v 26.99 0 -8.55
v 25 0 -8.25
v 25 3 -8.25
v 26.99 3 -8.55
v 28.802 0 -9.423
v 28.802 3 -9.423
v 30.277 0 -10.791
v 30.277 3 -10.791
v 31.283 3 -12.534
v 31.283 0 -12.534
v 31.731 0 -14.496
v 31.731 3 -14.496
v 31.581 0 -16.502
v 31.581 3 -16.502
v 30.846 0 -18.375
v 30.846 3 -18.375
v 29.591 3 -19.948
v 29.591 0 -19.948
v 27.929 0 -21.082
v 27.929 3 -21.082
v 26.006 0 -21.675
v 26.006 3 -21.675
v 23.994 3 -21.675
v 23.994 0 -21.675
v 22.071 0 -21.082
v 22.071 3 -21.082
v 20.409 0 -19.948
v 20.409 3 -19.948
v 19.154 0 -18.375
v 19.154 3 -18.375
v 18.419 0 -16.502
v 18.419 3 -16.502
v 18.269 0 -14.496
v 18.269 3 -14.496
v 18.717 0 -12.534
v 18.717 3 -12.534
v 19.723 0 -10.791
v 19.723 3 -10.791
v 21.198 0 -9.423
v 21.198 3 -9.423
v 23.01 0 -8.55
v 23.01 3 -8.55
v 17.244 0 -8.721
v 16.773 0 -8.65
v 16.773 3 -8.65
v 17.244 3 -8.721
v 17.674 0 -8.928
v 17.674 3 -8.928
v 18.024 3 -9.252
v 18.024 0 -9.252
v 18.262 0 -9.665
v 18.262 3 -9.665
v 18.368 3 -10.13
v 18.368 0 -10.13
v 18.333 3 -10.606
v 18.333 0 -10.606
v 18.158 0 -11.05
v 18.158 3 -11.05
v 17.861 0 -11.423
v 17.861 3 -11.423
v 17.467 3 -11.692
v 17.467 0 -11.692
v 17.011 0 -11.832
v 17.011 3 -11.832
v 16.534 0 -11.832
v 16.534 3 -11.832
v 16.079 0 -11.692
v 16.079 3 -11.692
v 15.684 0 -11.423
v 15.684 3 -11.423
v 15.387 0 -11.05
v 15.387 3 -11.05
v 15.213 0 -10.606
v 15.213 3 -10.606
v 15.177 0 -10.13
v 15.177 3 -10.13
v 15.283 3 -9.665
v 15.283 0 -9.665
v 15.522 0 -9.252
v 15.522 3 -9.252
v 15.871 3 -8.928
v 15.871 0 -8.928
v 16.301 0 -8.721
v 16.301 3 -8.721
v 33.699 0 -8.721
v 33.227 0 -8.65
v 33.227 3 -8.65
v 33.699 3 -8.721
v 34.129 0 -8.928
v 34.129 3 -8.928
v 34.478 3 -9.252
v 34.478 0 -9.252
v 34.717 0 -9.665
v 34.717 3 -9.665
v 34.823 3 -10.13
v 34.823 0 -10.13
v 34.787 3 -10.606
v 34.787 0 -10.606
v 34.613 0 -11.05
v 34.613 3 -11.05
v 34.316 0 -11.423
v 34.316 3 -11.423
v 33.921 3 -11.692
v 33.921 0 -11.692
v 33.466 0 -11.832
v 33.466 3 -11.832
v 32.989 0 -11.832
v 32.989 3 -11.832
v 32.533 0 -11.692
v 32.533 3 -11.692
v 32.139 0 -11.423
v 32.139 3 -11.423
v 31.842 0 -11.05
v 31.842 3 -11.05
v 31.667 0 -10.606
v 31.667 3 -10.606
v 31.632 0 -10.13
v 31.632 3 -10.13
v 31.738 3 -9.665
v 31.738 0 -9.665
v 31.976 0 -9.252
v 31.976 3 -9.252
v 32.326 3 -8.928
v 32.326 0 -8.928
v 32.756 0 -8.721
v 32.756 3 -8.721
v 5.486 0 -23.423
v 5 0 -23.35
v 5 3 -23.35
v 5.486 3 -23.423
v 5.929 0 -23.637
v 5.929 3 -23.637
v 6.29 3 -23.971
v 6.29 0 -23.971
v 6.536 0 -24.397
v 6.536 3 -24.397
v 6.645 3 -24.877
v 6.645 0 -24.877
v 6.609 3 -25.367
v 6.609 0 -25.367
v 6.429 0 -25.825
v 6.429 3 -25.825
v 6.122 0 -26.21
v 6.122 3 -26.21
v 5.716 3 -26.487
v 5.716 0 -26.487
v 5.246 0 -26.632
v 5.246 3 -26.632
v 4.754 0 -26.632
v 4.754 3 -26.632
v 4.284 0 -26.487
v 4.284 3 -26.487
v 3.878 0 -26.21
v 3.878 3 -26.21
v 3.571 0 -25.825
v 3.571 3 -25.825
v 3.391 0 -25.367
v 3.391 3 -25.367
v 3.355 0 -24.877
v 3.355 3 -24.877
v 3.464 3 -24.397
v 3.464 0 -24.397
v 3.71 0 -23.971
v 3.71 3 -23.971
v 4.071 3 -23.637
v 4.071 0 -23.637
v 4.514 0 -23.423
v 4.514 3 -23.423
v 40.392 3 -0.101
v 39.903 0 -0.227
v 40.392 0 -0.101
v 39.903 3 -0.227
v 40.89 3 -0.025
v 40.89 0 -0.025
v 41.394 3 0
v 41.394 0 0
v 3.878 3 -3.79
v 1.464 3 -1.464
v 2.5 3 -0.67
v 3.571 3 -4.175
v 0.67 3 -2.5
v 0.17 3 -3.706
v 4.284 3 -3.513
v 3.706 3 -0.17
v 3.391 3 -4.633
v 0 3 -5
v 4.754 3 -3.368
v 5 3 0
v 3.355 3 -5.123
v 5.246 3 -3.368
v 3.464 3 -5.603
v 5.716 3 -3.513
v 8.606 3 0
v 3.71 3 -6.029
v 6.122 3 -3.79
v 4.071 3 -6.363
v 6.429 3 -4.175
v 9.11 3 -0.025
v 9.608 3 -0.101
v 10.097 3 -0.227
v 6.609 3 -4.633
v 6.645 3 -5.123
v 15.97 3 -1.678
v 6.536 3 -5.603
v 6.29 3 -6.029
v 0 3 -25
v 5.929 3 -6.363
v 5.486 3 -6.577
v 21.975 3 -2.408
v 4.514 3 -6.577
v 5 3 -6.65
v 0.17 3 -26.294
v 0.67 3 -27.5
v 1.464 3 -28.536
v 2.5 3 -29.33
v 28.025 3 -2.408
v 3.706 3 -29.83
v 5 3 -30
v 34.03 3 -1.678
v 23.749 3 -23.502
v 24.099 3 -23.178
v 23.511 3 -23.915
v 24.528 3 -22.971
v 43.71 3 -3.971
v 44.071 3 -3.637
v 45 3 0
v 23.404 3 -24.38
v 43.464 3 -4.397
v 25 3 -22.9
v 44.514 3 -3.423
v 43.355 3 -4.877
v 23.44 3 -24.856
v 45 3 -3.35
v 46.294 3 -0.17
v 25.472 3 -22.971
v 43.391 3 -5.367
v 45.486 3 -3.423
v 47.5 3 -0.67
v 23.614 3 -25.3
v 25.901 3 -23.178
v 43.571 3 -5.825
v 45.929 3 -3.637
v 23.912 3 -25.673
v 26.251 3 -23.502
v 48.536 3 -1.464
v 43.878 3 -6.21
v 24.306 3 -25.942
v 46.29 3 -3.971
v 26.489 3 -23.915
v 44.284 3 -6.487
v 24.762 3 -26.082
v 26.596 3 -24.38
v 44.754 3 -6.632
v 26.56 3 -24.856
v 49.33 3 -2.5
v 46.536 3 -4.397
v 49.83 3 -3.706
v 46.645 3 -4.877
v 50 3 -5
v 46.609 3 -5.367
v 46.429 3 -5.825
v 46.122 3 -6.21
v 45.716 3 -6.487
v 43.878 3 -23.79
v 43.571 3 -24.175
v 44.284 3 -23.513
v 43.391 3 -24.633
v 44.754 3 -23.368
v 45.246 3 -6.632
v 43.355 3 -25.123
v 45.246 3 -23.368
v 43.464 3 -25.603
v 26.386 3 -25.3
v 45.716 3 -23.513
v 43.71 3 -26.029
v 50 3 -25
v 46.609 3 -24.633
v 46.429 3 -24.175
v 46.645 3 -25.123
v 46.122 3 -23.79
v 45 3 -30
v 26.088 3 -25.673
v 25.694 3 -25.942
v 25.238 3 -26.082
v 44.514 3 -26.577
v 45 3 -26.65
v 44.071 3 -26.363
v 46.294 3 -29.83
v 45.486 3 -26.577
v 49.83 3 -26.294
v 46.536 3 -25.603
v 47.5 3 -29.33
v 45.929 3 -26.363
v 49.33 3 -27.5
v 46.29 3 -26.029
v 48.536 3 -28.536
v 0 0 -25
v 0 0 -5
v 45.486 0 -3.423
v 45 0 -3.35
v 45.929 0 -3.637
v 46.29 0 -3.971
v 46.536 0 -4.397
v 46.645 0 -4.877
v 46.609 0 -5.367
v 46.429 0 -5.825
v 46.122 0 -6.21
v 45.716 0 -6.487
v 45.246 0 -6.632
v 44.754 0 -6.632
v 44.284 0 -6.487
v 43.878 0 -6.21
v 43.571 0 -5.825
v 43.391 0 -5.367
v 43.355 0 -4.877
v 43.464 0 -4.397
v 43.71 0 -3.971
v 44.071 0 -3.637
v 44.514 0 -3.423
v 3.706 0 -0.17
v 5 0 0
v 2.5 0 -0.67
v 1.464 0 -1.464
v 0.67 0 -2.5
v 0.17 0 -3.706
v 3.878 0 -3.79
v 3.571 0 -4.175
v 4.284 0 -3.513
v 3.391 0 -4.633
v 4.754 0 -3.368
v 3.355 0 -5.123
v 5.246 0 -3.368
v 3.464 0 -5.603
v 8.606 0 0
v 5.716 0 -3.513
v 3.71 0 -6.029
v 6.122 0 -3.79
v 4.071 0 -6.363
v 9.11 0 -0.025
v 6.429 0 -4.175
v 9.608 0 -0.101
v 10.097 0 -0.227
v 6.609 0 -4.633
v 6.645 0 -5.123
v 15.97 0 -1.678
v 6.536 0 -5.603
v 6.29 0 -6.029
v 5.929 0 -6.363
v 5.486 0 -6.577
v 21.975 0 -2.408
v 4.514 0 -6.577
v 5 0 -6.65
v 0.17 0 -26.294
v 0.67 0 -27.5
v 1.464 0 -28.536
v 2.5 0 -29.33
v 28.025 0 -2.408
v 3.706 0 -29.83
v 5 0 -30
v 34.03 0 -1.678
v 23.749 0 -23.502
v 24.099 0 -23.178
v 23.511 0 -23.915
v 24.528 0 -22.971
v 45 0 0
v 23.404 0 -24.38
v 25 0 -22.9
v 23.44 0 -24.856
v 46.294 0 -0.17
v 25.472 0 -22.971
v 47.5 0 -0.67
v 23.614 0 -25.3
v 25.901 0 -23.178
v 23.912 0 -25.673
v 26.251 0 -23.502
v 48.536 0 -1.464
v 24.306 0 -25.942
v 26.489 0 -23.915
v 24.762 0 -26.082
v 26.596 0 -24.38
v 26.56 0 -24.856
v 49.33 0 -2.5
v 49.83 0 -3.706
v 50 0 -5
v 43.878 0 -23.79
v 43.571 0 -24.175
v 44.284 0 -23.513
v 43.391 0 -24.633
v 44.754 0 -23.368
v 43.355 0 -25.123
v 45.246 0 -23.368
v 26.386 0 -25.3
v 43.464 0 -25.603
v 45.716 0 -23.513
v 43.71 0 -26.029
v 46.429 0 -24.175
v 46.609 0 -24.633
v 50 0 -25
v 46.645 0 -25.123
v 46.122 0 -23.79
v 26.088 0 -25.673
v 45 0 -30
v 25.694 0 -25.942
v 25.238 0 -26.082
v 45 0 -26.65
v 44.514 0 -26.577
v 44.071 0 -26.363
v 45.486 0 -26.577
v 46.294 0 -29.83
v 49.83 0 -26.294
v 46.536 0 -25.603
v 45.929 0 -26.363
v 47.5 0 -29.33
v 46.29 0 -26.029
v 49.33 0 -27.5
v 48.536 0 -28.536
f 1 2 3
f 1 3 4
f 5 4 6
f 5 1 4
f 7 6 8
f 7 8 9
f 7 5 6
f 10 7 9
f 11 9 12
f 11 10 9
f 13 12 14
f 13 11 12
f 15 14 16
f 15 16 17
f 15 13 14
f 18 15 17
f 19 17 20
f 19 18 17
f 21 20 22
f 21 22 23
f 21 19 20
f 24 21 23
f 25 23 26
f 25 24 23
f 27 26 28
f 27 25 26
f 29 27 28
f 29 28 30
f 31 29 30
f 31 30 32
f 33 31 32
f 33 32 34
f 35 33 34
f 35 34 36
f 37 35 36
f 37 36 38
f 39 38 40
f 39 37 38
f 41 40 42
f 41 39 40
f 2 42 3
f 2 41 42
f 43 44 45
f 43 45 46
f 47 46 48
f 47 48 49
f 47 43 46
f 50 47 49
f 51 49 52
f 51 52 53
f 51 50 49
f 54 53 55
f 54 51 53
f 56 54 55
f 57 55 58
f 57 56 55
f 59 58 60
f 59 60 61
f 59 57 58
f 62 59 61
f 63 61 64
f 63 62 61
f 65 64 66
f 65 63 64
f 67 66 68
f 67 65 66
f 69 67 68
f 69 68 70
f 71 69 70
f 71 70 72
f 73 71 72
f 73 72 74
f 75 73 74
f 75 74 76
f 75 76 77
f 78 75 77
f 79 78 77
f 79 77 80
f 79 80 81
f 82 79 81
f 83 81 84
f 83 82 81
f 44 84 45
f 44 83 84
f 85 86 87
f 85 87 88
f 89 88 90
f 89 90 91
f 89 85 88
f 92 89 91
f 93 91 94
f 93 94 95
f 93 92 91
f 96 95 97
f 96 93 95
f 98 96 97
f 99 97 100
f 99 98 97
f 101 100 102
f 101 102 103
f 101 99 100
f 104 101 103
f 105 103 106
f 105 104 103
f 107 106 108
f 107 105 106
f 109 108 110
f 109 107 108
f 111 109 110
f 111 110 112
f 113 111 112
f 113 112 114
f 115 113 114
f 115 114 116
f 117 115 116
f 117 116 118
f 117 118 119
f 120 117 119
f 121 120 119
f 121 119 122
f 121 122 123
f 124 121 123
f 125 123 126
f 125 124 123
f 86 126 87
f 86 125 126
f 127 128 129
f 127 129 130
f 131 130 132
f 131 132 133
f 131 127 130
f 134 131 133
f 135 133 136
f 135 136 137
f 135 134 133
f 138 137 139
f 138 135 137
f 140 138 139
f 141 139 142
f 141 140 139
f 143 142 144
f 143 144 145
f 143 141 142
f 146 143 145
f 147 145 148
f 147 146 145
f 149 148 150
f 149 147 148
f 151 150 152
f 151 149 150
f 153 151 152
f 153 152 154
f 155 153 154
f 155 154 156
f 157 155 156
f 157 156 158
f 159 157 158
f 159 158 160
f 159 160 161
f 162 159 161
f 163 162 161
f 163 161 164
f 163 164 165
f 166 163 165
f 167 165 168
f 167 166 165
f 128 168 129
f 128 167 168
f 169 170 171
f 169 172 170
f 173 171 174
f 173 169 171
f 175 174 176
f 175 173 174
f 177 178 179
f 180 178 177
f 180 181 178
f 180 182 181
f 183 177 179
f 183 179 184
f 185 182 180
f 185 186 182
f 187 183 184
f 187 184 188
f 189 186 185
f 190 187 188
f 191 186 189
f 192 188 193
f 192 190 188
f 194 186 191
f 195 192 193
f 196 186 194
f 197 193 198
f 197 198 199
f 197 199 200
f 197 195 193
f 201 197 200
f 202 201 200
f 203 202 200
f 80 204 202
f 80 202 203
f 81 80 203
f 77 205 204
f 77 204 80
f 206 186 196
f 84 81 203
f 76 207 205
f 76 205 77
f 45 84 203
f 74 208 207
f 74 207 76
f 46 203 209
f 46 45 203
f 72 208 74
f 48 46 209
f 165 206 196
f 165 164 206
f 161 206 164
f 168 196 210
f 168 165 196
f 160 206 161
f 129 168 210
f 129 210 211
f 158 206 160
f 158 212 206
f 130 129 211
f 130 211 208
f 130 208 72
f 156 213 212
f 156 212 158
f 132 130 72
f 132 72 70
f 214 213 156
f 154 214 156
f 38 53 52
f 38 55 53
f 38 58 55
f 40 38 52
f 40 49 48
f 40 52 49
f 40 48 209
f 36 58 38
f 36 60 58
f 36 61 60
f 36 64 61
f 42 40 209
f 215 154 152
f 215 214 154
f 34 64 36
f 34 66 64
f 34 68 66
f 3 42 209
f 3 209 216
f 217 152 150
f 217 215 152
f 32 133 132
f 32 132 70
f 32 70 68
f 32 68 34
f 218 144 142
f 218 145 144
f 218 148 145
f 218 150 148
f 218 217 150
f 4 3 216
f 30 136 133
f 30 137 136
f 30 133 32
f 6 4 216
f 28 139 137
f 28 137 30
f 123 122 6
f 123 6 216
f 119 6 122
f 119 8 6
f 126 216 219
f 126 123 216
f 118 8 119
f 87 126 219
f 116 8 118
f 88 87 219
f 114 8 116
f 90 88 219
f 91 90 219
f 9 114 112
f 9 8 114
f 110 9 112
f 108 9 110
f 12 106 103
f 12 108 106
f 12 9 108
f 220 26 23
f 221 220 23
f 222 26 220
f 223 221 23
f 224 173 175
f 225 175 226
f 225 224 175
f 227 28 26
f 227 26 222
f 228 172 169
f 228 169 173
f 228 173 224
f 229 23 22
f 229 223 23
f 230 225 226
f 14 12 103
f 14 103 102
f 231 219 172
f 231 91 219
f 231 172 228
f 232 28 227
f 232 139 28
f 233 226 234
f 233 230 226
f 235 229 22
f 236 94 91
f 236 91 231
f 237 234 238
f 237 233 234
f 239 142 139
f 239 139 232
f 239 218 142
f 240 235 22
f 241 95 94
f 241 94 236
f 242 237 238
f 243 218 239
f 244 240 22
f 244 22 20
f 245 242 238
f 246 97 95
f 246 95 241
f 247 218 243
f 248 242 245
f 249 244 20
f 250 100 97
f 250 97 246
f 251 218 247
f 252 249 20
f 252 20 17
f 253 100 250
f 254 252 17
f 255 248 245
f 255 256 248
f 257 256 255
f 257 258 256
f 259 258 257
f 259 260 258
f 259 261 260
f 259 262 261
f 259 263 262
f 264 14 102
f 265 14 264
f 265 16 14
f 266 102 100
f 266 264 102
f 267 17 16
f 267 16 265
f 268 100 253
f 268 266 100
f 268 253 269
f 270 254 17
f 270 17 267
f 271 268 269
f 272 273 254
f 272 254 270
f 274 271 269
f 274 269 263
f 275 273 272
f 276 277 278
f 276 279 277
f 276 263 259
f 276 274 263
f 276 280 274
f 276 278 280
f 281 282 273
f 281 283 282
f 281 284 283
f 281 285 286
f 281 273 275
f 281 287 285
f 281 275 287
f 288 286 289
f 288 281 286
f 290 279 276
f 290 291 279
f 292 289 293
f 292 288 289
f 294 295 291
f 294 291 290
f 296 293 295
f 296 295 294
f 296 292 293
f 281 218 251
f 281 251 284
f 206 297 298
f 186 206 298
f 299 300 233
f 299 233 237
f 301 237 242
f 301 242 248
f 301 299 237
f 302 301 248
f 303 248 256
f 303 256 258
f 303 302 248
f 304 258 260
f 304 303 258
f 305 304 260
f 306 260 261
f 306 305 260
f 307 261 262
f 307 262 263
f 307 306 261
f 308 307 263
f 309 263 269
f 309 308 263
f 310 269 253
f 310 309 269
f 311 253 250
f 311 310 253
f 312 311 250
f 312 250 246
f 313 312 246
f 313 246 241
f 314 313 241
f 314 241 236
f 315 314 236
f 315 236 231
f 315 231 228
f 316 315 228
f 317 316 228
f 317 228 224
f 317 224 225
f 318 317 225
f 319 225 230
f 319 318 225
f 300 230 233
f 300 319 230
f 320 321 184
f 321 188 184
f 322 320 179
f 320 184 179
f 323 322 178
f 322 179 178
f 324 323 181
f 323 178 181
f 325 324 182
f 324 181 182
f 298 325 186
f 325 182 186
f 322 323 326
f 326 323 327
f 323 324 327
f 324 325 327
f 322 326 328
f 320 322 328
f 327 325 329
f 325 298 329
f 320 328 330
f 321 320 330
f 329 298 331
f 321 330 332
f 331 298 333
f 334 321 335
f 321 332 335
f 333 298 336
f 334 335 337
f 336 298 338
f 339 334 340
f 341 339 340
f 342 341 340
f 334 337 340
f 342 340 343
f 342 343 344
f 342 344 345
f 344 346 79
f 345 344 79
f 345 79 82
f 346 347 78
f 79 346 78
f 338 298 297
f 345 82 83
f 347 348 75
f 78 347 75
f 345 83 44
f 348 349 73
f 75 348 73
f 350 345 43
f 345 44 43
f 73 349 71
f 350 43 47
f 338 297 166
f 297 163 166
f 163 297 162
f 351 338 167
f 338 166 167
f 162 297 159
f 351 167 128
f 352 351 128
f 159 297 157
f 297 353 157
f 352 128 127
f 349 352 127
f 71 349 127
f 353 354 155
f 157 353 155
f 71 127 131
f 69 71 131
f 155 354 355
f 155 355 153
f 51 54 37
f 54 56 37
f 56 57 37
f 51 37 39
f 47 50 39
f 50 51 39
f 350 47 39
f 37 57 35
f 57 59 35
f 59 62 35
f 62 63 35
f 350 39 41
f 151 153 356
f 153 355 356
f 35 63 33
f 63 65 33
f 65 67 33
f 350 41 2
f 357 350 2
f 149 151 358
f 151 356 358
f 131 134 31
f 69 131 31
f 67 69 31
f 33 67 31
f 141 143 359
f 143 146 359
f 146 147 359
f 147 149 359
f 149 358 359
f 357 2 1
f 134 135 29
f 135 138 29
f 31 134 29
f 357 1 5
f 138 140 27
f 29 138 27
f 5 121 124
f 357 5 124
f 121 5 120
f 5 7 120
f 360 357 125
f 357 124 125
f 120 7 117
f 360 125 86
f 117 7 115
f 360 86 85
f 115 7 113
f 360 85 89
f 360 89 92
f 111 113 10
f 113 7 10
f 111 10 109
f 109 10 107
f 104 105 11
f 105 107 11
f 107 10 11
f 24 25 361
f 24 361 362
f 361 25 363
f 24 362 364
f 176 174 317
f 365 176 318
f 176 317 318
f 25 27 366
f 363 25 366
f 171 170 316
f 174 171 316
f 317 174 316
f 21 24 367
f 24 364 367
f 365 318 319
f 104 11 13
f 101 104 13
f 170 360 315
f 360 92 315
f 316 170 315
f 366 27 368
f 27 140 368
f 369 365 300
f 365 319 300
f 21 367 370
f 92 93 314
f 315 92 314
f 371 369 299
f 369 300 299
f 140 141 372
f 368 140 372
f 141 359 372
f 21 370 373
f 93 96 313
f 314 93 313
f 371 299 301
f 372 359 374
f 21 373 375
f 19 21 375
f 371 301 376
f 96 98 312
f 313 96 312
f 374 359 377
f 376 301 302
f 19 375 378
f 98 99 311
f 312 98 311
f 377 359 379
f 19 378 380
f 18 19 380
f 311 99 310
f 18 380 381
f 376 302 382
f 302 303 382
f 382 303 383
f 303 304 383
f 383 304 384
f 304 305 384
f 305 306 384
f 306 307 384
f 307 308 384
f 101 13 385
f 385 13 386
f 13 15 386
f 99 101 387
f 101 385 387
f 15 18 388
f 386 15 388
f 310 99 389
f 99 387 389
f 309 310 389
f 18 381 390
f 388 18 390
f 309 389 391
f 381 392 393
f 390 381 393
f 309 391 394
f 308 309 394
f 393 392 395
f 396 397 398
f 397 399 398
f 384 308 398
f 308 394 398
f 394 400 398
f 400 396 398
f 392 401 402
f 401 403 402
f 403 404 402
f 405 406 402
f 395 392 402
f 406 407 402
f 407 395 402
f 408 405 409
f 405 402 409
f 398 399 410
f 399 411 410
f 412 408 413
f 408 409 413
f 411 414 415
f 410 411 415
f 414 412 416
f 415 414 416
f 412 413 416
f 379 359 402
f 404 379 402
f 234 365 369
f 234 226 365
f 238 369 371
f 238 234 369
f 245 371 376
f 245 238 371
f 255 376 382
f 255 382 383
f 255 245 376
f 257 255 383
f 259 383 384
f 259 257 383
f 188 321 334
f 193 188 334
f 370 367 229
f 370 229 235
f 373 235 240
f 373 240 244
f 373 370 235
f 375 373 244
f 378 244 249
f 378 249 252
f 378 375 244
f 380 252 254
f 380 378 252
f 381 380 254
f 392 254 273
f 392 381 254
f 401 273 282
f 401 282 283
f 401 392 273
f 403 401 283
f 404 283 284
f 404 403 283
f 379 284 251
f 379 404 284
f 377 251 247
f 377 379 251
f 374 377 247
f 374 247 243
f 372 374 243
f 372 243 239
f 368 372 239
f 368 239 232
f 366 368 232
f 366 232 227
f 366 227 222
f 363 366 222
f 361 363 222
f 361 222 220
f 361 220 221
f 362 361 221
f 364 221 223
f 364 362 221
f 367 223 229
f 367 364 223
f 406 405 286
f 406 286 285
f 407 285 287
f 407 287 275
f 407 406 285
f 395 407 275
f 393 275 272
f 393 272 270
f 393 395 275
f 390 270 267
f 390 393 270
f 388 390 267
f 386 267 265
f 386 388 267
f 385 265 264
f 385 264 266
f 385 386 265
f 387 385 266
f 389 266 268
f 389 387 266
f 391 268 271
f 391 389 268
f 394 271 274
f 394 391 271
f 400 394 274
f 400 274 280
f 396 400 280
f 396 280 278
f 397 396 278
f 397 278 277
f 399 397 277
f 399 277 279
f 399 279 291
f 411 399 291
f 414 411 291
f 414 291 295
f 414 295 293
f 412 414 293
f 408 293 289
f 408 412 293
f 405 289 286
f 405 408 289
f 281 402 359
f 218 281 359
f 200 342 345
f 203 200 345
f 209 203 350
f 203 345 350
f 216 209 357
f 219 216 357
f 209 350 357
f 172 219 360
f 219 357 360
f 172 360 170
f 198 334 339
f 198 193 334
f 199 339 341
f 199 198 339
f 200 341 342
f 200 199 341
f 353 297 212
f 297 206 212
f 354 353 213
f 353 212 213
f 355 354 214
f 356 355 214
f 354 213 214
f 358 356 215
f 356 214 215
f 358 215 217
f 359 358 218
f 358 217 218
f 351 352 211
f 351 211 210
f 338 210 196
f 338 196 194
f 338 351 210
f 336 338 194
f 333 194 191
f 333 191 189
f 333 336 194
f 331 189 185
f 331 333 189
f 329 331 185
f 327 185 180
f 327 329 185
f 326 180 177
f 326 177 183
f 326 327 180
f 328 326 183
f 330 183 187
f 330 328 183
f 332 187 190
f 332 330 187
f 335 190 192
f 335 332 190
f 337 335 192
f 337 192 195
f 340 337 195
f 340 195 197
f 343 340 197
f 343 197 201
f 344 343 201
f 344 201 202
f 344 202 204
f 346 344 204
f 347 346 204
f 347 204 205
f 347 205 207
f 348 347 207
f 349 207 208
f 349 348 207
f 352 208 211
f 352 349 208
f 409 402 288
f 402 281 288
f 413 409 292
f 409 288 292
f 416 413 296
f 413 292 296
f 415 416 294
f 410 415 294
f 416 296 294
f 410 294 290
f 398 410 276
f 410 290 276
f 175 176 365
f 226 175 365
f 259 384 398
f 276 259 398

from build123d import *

# Parameters (mm, degrees)
SKETCH_1_R      = 1.65
SKETCH_1_R_2    = 6.75
SKETCH_1_R_3    = 1.6
EXTRUDE_1_DEPTH = 3
FILLET_1_R      = 5


with BuildPart() as part:
    # ｽｹｯﾁ1 → ﾎﾞｽ - 押し出し1 (new body)
    with BuildSketch(Plane(origin=(0, 0, 0), x_dir=(1, 0, 0), z_dir=(0, 1, 0))):
        with BuildLine():
            Line((0, 0), (9.387505004, 0))
            ThreePointArc((9.387505004, 0), (25, 2.5), (40.612494996, 0))
            Line((40.612494996, 0), (50, 0))
            Line((50, 0), (50, 30))
            Line((50, 30), (0, 30))
            Line((0, 30), (0, 0))
        make_face()
        with Locations(Location((45, 5, 0), (0, 0, 270))):
            Circle(SKETCH_1_R, mode=Mode.SUBTRACT)
        with Locations(Location((5, 5, 0), (0, 0, 90))):
            Circle(SKETCH_1_R, mode=Mode.SUBTRACT)
        with Locations(Location((5, 25, 0), (0, 0, 270))):
            Circle(SKETCH_1_R, mode=Mode.SUBTRACT)
        with Locations(Location((45, 25, 0), (0, 0, 90))):
            Circle(SKETCH_1_R, mode=Mode.SUBTRACT)
        with Locations(Location((25, 15, 0), (0, 0, 270))):
            Circle(SKETCH_1_R_2, mode=Mode.SUBTRACT)
        with Locations(Location((25, 24.5, 0), (0, 0, 270))):
            Circle(SKETCH_1_R_3, mode=Mode.SUBTRACT)
        with Locations(Location((33.227241336, 10.25, 0), (0, 0, 270))):
            Circle(SKETCH_1_R_3, mode=Mode.SUBTRACT)
        with Locations(Location((16.772758664, 10.25, 0), (0, 0, 270))):
            Circle(SKETCH_1_R_3, mode=Mode.SUBTRACT)
    extrude(amount=EXTRUDE_1_DEPTH)

    # ﾌｨﾚｯﾄ1
    fillet_1_edges = [part.edges().sort_by_distance(p)[0] for p in [
        (0, 1.5, -30),
        (50, 1.5, -30),
        (50, 1.5, 0),
        (40.612494996, 1.5, 0),
        (9.387505004, 1.5, 0),
        (0, 1.5, 0),
    ]]
    fillet(fillet_1_edges, radius=FILLET_1_R)


solid = part.part
